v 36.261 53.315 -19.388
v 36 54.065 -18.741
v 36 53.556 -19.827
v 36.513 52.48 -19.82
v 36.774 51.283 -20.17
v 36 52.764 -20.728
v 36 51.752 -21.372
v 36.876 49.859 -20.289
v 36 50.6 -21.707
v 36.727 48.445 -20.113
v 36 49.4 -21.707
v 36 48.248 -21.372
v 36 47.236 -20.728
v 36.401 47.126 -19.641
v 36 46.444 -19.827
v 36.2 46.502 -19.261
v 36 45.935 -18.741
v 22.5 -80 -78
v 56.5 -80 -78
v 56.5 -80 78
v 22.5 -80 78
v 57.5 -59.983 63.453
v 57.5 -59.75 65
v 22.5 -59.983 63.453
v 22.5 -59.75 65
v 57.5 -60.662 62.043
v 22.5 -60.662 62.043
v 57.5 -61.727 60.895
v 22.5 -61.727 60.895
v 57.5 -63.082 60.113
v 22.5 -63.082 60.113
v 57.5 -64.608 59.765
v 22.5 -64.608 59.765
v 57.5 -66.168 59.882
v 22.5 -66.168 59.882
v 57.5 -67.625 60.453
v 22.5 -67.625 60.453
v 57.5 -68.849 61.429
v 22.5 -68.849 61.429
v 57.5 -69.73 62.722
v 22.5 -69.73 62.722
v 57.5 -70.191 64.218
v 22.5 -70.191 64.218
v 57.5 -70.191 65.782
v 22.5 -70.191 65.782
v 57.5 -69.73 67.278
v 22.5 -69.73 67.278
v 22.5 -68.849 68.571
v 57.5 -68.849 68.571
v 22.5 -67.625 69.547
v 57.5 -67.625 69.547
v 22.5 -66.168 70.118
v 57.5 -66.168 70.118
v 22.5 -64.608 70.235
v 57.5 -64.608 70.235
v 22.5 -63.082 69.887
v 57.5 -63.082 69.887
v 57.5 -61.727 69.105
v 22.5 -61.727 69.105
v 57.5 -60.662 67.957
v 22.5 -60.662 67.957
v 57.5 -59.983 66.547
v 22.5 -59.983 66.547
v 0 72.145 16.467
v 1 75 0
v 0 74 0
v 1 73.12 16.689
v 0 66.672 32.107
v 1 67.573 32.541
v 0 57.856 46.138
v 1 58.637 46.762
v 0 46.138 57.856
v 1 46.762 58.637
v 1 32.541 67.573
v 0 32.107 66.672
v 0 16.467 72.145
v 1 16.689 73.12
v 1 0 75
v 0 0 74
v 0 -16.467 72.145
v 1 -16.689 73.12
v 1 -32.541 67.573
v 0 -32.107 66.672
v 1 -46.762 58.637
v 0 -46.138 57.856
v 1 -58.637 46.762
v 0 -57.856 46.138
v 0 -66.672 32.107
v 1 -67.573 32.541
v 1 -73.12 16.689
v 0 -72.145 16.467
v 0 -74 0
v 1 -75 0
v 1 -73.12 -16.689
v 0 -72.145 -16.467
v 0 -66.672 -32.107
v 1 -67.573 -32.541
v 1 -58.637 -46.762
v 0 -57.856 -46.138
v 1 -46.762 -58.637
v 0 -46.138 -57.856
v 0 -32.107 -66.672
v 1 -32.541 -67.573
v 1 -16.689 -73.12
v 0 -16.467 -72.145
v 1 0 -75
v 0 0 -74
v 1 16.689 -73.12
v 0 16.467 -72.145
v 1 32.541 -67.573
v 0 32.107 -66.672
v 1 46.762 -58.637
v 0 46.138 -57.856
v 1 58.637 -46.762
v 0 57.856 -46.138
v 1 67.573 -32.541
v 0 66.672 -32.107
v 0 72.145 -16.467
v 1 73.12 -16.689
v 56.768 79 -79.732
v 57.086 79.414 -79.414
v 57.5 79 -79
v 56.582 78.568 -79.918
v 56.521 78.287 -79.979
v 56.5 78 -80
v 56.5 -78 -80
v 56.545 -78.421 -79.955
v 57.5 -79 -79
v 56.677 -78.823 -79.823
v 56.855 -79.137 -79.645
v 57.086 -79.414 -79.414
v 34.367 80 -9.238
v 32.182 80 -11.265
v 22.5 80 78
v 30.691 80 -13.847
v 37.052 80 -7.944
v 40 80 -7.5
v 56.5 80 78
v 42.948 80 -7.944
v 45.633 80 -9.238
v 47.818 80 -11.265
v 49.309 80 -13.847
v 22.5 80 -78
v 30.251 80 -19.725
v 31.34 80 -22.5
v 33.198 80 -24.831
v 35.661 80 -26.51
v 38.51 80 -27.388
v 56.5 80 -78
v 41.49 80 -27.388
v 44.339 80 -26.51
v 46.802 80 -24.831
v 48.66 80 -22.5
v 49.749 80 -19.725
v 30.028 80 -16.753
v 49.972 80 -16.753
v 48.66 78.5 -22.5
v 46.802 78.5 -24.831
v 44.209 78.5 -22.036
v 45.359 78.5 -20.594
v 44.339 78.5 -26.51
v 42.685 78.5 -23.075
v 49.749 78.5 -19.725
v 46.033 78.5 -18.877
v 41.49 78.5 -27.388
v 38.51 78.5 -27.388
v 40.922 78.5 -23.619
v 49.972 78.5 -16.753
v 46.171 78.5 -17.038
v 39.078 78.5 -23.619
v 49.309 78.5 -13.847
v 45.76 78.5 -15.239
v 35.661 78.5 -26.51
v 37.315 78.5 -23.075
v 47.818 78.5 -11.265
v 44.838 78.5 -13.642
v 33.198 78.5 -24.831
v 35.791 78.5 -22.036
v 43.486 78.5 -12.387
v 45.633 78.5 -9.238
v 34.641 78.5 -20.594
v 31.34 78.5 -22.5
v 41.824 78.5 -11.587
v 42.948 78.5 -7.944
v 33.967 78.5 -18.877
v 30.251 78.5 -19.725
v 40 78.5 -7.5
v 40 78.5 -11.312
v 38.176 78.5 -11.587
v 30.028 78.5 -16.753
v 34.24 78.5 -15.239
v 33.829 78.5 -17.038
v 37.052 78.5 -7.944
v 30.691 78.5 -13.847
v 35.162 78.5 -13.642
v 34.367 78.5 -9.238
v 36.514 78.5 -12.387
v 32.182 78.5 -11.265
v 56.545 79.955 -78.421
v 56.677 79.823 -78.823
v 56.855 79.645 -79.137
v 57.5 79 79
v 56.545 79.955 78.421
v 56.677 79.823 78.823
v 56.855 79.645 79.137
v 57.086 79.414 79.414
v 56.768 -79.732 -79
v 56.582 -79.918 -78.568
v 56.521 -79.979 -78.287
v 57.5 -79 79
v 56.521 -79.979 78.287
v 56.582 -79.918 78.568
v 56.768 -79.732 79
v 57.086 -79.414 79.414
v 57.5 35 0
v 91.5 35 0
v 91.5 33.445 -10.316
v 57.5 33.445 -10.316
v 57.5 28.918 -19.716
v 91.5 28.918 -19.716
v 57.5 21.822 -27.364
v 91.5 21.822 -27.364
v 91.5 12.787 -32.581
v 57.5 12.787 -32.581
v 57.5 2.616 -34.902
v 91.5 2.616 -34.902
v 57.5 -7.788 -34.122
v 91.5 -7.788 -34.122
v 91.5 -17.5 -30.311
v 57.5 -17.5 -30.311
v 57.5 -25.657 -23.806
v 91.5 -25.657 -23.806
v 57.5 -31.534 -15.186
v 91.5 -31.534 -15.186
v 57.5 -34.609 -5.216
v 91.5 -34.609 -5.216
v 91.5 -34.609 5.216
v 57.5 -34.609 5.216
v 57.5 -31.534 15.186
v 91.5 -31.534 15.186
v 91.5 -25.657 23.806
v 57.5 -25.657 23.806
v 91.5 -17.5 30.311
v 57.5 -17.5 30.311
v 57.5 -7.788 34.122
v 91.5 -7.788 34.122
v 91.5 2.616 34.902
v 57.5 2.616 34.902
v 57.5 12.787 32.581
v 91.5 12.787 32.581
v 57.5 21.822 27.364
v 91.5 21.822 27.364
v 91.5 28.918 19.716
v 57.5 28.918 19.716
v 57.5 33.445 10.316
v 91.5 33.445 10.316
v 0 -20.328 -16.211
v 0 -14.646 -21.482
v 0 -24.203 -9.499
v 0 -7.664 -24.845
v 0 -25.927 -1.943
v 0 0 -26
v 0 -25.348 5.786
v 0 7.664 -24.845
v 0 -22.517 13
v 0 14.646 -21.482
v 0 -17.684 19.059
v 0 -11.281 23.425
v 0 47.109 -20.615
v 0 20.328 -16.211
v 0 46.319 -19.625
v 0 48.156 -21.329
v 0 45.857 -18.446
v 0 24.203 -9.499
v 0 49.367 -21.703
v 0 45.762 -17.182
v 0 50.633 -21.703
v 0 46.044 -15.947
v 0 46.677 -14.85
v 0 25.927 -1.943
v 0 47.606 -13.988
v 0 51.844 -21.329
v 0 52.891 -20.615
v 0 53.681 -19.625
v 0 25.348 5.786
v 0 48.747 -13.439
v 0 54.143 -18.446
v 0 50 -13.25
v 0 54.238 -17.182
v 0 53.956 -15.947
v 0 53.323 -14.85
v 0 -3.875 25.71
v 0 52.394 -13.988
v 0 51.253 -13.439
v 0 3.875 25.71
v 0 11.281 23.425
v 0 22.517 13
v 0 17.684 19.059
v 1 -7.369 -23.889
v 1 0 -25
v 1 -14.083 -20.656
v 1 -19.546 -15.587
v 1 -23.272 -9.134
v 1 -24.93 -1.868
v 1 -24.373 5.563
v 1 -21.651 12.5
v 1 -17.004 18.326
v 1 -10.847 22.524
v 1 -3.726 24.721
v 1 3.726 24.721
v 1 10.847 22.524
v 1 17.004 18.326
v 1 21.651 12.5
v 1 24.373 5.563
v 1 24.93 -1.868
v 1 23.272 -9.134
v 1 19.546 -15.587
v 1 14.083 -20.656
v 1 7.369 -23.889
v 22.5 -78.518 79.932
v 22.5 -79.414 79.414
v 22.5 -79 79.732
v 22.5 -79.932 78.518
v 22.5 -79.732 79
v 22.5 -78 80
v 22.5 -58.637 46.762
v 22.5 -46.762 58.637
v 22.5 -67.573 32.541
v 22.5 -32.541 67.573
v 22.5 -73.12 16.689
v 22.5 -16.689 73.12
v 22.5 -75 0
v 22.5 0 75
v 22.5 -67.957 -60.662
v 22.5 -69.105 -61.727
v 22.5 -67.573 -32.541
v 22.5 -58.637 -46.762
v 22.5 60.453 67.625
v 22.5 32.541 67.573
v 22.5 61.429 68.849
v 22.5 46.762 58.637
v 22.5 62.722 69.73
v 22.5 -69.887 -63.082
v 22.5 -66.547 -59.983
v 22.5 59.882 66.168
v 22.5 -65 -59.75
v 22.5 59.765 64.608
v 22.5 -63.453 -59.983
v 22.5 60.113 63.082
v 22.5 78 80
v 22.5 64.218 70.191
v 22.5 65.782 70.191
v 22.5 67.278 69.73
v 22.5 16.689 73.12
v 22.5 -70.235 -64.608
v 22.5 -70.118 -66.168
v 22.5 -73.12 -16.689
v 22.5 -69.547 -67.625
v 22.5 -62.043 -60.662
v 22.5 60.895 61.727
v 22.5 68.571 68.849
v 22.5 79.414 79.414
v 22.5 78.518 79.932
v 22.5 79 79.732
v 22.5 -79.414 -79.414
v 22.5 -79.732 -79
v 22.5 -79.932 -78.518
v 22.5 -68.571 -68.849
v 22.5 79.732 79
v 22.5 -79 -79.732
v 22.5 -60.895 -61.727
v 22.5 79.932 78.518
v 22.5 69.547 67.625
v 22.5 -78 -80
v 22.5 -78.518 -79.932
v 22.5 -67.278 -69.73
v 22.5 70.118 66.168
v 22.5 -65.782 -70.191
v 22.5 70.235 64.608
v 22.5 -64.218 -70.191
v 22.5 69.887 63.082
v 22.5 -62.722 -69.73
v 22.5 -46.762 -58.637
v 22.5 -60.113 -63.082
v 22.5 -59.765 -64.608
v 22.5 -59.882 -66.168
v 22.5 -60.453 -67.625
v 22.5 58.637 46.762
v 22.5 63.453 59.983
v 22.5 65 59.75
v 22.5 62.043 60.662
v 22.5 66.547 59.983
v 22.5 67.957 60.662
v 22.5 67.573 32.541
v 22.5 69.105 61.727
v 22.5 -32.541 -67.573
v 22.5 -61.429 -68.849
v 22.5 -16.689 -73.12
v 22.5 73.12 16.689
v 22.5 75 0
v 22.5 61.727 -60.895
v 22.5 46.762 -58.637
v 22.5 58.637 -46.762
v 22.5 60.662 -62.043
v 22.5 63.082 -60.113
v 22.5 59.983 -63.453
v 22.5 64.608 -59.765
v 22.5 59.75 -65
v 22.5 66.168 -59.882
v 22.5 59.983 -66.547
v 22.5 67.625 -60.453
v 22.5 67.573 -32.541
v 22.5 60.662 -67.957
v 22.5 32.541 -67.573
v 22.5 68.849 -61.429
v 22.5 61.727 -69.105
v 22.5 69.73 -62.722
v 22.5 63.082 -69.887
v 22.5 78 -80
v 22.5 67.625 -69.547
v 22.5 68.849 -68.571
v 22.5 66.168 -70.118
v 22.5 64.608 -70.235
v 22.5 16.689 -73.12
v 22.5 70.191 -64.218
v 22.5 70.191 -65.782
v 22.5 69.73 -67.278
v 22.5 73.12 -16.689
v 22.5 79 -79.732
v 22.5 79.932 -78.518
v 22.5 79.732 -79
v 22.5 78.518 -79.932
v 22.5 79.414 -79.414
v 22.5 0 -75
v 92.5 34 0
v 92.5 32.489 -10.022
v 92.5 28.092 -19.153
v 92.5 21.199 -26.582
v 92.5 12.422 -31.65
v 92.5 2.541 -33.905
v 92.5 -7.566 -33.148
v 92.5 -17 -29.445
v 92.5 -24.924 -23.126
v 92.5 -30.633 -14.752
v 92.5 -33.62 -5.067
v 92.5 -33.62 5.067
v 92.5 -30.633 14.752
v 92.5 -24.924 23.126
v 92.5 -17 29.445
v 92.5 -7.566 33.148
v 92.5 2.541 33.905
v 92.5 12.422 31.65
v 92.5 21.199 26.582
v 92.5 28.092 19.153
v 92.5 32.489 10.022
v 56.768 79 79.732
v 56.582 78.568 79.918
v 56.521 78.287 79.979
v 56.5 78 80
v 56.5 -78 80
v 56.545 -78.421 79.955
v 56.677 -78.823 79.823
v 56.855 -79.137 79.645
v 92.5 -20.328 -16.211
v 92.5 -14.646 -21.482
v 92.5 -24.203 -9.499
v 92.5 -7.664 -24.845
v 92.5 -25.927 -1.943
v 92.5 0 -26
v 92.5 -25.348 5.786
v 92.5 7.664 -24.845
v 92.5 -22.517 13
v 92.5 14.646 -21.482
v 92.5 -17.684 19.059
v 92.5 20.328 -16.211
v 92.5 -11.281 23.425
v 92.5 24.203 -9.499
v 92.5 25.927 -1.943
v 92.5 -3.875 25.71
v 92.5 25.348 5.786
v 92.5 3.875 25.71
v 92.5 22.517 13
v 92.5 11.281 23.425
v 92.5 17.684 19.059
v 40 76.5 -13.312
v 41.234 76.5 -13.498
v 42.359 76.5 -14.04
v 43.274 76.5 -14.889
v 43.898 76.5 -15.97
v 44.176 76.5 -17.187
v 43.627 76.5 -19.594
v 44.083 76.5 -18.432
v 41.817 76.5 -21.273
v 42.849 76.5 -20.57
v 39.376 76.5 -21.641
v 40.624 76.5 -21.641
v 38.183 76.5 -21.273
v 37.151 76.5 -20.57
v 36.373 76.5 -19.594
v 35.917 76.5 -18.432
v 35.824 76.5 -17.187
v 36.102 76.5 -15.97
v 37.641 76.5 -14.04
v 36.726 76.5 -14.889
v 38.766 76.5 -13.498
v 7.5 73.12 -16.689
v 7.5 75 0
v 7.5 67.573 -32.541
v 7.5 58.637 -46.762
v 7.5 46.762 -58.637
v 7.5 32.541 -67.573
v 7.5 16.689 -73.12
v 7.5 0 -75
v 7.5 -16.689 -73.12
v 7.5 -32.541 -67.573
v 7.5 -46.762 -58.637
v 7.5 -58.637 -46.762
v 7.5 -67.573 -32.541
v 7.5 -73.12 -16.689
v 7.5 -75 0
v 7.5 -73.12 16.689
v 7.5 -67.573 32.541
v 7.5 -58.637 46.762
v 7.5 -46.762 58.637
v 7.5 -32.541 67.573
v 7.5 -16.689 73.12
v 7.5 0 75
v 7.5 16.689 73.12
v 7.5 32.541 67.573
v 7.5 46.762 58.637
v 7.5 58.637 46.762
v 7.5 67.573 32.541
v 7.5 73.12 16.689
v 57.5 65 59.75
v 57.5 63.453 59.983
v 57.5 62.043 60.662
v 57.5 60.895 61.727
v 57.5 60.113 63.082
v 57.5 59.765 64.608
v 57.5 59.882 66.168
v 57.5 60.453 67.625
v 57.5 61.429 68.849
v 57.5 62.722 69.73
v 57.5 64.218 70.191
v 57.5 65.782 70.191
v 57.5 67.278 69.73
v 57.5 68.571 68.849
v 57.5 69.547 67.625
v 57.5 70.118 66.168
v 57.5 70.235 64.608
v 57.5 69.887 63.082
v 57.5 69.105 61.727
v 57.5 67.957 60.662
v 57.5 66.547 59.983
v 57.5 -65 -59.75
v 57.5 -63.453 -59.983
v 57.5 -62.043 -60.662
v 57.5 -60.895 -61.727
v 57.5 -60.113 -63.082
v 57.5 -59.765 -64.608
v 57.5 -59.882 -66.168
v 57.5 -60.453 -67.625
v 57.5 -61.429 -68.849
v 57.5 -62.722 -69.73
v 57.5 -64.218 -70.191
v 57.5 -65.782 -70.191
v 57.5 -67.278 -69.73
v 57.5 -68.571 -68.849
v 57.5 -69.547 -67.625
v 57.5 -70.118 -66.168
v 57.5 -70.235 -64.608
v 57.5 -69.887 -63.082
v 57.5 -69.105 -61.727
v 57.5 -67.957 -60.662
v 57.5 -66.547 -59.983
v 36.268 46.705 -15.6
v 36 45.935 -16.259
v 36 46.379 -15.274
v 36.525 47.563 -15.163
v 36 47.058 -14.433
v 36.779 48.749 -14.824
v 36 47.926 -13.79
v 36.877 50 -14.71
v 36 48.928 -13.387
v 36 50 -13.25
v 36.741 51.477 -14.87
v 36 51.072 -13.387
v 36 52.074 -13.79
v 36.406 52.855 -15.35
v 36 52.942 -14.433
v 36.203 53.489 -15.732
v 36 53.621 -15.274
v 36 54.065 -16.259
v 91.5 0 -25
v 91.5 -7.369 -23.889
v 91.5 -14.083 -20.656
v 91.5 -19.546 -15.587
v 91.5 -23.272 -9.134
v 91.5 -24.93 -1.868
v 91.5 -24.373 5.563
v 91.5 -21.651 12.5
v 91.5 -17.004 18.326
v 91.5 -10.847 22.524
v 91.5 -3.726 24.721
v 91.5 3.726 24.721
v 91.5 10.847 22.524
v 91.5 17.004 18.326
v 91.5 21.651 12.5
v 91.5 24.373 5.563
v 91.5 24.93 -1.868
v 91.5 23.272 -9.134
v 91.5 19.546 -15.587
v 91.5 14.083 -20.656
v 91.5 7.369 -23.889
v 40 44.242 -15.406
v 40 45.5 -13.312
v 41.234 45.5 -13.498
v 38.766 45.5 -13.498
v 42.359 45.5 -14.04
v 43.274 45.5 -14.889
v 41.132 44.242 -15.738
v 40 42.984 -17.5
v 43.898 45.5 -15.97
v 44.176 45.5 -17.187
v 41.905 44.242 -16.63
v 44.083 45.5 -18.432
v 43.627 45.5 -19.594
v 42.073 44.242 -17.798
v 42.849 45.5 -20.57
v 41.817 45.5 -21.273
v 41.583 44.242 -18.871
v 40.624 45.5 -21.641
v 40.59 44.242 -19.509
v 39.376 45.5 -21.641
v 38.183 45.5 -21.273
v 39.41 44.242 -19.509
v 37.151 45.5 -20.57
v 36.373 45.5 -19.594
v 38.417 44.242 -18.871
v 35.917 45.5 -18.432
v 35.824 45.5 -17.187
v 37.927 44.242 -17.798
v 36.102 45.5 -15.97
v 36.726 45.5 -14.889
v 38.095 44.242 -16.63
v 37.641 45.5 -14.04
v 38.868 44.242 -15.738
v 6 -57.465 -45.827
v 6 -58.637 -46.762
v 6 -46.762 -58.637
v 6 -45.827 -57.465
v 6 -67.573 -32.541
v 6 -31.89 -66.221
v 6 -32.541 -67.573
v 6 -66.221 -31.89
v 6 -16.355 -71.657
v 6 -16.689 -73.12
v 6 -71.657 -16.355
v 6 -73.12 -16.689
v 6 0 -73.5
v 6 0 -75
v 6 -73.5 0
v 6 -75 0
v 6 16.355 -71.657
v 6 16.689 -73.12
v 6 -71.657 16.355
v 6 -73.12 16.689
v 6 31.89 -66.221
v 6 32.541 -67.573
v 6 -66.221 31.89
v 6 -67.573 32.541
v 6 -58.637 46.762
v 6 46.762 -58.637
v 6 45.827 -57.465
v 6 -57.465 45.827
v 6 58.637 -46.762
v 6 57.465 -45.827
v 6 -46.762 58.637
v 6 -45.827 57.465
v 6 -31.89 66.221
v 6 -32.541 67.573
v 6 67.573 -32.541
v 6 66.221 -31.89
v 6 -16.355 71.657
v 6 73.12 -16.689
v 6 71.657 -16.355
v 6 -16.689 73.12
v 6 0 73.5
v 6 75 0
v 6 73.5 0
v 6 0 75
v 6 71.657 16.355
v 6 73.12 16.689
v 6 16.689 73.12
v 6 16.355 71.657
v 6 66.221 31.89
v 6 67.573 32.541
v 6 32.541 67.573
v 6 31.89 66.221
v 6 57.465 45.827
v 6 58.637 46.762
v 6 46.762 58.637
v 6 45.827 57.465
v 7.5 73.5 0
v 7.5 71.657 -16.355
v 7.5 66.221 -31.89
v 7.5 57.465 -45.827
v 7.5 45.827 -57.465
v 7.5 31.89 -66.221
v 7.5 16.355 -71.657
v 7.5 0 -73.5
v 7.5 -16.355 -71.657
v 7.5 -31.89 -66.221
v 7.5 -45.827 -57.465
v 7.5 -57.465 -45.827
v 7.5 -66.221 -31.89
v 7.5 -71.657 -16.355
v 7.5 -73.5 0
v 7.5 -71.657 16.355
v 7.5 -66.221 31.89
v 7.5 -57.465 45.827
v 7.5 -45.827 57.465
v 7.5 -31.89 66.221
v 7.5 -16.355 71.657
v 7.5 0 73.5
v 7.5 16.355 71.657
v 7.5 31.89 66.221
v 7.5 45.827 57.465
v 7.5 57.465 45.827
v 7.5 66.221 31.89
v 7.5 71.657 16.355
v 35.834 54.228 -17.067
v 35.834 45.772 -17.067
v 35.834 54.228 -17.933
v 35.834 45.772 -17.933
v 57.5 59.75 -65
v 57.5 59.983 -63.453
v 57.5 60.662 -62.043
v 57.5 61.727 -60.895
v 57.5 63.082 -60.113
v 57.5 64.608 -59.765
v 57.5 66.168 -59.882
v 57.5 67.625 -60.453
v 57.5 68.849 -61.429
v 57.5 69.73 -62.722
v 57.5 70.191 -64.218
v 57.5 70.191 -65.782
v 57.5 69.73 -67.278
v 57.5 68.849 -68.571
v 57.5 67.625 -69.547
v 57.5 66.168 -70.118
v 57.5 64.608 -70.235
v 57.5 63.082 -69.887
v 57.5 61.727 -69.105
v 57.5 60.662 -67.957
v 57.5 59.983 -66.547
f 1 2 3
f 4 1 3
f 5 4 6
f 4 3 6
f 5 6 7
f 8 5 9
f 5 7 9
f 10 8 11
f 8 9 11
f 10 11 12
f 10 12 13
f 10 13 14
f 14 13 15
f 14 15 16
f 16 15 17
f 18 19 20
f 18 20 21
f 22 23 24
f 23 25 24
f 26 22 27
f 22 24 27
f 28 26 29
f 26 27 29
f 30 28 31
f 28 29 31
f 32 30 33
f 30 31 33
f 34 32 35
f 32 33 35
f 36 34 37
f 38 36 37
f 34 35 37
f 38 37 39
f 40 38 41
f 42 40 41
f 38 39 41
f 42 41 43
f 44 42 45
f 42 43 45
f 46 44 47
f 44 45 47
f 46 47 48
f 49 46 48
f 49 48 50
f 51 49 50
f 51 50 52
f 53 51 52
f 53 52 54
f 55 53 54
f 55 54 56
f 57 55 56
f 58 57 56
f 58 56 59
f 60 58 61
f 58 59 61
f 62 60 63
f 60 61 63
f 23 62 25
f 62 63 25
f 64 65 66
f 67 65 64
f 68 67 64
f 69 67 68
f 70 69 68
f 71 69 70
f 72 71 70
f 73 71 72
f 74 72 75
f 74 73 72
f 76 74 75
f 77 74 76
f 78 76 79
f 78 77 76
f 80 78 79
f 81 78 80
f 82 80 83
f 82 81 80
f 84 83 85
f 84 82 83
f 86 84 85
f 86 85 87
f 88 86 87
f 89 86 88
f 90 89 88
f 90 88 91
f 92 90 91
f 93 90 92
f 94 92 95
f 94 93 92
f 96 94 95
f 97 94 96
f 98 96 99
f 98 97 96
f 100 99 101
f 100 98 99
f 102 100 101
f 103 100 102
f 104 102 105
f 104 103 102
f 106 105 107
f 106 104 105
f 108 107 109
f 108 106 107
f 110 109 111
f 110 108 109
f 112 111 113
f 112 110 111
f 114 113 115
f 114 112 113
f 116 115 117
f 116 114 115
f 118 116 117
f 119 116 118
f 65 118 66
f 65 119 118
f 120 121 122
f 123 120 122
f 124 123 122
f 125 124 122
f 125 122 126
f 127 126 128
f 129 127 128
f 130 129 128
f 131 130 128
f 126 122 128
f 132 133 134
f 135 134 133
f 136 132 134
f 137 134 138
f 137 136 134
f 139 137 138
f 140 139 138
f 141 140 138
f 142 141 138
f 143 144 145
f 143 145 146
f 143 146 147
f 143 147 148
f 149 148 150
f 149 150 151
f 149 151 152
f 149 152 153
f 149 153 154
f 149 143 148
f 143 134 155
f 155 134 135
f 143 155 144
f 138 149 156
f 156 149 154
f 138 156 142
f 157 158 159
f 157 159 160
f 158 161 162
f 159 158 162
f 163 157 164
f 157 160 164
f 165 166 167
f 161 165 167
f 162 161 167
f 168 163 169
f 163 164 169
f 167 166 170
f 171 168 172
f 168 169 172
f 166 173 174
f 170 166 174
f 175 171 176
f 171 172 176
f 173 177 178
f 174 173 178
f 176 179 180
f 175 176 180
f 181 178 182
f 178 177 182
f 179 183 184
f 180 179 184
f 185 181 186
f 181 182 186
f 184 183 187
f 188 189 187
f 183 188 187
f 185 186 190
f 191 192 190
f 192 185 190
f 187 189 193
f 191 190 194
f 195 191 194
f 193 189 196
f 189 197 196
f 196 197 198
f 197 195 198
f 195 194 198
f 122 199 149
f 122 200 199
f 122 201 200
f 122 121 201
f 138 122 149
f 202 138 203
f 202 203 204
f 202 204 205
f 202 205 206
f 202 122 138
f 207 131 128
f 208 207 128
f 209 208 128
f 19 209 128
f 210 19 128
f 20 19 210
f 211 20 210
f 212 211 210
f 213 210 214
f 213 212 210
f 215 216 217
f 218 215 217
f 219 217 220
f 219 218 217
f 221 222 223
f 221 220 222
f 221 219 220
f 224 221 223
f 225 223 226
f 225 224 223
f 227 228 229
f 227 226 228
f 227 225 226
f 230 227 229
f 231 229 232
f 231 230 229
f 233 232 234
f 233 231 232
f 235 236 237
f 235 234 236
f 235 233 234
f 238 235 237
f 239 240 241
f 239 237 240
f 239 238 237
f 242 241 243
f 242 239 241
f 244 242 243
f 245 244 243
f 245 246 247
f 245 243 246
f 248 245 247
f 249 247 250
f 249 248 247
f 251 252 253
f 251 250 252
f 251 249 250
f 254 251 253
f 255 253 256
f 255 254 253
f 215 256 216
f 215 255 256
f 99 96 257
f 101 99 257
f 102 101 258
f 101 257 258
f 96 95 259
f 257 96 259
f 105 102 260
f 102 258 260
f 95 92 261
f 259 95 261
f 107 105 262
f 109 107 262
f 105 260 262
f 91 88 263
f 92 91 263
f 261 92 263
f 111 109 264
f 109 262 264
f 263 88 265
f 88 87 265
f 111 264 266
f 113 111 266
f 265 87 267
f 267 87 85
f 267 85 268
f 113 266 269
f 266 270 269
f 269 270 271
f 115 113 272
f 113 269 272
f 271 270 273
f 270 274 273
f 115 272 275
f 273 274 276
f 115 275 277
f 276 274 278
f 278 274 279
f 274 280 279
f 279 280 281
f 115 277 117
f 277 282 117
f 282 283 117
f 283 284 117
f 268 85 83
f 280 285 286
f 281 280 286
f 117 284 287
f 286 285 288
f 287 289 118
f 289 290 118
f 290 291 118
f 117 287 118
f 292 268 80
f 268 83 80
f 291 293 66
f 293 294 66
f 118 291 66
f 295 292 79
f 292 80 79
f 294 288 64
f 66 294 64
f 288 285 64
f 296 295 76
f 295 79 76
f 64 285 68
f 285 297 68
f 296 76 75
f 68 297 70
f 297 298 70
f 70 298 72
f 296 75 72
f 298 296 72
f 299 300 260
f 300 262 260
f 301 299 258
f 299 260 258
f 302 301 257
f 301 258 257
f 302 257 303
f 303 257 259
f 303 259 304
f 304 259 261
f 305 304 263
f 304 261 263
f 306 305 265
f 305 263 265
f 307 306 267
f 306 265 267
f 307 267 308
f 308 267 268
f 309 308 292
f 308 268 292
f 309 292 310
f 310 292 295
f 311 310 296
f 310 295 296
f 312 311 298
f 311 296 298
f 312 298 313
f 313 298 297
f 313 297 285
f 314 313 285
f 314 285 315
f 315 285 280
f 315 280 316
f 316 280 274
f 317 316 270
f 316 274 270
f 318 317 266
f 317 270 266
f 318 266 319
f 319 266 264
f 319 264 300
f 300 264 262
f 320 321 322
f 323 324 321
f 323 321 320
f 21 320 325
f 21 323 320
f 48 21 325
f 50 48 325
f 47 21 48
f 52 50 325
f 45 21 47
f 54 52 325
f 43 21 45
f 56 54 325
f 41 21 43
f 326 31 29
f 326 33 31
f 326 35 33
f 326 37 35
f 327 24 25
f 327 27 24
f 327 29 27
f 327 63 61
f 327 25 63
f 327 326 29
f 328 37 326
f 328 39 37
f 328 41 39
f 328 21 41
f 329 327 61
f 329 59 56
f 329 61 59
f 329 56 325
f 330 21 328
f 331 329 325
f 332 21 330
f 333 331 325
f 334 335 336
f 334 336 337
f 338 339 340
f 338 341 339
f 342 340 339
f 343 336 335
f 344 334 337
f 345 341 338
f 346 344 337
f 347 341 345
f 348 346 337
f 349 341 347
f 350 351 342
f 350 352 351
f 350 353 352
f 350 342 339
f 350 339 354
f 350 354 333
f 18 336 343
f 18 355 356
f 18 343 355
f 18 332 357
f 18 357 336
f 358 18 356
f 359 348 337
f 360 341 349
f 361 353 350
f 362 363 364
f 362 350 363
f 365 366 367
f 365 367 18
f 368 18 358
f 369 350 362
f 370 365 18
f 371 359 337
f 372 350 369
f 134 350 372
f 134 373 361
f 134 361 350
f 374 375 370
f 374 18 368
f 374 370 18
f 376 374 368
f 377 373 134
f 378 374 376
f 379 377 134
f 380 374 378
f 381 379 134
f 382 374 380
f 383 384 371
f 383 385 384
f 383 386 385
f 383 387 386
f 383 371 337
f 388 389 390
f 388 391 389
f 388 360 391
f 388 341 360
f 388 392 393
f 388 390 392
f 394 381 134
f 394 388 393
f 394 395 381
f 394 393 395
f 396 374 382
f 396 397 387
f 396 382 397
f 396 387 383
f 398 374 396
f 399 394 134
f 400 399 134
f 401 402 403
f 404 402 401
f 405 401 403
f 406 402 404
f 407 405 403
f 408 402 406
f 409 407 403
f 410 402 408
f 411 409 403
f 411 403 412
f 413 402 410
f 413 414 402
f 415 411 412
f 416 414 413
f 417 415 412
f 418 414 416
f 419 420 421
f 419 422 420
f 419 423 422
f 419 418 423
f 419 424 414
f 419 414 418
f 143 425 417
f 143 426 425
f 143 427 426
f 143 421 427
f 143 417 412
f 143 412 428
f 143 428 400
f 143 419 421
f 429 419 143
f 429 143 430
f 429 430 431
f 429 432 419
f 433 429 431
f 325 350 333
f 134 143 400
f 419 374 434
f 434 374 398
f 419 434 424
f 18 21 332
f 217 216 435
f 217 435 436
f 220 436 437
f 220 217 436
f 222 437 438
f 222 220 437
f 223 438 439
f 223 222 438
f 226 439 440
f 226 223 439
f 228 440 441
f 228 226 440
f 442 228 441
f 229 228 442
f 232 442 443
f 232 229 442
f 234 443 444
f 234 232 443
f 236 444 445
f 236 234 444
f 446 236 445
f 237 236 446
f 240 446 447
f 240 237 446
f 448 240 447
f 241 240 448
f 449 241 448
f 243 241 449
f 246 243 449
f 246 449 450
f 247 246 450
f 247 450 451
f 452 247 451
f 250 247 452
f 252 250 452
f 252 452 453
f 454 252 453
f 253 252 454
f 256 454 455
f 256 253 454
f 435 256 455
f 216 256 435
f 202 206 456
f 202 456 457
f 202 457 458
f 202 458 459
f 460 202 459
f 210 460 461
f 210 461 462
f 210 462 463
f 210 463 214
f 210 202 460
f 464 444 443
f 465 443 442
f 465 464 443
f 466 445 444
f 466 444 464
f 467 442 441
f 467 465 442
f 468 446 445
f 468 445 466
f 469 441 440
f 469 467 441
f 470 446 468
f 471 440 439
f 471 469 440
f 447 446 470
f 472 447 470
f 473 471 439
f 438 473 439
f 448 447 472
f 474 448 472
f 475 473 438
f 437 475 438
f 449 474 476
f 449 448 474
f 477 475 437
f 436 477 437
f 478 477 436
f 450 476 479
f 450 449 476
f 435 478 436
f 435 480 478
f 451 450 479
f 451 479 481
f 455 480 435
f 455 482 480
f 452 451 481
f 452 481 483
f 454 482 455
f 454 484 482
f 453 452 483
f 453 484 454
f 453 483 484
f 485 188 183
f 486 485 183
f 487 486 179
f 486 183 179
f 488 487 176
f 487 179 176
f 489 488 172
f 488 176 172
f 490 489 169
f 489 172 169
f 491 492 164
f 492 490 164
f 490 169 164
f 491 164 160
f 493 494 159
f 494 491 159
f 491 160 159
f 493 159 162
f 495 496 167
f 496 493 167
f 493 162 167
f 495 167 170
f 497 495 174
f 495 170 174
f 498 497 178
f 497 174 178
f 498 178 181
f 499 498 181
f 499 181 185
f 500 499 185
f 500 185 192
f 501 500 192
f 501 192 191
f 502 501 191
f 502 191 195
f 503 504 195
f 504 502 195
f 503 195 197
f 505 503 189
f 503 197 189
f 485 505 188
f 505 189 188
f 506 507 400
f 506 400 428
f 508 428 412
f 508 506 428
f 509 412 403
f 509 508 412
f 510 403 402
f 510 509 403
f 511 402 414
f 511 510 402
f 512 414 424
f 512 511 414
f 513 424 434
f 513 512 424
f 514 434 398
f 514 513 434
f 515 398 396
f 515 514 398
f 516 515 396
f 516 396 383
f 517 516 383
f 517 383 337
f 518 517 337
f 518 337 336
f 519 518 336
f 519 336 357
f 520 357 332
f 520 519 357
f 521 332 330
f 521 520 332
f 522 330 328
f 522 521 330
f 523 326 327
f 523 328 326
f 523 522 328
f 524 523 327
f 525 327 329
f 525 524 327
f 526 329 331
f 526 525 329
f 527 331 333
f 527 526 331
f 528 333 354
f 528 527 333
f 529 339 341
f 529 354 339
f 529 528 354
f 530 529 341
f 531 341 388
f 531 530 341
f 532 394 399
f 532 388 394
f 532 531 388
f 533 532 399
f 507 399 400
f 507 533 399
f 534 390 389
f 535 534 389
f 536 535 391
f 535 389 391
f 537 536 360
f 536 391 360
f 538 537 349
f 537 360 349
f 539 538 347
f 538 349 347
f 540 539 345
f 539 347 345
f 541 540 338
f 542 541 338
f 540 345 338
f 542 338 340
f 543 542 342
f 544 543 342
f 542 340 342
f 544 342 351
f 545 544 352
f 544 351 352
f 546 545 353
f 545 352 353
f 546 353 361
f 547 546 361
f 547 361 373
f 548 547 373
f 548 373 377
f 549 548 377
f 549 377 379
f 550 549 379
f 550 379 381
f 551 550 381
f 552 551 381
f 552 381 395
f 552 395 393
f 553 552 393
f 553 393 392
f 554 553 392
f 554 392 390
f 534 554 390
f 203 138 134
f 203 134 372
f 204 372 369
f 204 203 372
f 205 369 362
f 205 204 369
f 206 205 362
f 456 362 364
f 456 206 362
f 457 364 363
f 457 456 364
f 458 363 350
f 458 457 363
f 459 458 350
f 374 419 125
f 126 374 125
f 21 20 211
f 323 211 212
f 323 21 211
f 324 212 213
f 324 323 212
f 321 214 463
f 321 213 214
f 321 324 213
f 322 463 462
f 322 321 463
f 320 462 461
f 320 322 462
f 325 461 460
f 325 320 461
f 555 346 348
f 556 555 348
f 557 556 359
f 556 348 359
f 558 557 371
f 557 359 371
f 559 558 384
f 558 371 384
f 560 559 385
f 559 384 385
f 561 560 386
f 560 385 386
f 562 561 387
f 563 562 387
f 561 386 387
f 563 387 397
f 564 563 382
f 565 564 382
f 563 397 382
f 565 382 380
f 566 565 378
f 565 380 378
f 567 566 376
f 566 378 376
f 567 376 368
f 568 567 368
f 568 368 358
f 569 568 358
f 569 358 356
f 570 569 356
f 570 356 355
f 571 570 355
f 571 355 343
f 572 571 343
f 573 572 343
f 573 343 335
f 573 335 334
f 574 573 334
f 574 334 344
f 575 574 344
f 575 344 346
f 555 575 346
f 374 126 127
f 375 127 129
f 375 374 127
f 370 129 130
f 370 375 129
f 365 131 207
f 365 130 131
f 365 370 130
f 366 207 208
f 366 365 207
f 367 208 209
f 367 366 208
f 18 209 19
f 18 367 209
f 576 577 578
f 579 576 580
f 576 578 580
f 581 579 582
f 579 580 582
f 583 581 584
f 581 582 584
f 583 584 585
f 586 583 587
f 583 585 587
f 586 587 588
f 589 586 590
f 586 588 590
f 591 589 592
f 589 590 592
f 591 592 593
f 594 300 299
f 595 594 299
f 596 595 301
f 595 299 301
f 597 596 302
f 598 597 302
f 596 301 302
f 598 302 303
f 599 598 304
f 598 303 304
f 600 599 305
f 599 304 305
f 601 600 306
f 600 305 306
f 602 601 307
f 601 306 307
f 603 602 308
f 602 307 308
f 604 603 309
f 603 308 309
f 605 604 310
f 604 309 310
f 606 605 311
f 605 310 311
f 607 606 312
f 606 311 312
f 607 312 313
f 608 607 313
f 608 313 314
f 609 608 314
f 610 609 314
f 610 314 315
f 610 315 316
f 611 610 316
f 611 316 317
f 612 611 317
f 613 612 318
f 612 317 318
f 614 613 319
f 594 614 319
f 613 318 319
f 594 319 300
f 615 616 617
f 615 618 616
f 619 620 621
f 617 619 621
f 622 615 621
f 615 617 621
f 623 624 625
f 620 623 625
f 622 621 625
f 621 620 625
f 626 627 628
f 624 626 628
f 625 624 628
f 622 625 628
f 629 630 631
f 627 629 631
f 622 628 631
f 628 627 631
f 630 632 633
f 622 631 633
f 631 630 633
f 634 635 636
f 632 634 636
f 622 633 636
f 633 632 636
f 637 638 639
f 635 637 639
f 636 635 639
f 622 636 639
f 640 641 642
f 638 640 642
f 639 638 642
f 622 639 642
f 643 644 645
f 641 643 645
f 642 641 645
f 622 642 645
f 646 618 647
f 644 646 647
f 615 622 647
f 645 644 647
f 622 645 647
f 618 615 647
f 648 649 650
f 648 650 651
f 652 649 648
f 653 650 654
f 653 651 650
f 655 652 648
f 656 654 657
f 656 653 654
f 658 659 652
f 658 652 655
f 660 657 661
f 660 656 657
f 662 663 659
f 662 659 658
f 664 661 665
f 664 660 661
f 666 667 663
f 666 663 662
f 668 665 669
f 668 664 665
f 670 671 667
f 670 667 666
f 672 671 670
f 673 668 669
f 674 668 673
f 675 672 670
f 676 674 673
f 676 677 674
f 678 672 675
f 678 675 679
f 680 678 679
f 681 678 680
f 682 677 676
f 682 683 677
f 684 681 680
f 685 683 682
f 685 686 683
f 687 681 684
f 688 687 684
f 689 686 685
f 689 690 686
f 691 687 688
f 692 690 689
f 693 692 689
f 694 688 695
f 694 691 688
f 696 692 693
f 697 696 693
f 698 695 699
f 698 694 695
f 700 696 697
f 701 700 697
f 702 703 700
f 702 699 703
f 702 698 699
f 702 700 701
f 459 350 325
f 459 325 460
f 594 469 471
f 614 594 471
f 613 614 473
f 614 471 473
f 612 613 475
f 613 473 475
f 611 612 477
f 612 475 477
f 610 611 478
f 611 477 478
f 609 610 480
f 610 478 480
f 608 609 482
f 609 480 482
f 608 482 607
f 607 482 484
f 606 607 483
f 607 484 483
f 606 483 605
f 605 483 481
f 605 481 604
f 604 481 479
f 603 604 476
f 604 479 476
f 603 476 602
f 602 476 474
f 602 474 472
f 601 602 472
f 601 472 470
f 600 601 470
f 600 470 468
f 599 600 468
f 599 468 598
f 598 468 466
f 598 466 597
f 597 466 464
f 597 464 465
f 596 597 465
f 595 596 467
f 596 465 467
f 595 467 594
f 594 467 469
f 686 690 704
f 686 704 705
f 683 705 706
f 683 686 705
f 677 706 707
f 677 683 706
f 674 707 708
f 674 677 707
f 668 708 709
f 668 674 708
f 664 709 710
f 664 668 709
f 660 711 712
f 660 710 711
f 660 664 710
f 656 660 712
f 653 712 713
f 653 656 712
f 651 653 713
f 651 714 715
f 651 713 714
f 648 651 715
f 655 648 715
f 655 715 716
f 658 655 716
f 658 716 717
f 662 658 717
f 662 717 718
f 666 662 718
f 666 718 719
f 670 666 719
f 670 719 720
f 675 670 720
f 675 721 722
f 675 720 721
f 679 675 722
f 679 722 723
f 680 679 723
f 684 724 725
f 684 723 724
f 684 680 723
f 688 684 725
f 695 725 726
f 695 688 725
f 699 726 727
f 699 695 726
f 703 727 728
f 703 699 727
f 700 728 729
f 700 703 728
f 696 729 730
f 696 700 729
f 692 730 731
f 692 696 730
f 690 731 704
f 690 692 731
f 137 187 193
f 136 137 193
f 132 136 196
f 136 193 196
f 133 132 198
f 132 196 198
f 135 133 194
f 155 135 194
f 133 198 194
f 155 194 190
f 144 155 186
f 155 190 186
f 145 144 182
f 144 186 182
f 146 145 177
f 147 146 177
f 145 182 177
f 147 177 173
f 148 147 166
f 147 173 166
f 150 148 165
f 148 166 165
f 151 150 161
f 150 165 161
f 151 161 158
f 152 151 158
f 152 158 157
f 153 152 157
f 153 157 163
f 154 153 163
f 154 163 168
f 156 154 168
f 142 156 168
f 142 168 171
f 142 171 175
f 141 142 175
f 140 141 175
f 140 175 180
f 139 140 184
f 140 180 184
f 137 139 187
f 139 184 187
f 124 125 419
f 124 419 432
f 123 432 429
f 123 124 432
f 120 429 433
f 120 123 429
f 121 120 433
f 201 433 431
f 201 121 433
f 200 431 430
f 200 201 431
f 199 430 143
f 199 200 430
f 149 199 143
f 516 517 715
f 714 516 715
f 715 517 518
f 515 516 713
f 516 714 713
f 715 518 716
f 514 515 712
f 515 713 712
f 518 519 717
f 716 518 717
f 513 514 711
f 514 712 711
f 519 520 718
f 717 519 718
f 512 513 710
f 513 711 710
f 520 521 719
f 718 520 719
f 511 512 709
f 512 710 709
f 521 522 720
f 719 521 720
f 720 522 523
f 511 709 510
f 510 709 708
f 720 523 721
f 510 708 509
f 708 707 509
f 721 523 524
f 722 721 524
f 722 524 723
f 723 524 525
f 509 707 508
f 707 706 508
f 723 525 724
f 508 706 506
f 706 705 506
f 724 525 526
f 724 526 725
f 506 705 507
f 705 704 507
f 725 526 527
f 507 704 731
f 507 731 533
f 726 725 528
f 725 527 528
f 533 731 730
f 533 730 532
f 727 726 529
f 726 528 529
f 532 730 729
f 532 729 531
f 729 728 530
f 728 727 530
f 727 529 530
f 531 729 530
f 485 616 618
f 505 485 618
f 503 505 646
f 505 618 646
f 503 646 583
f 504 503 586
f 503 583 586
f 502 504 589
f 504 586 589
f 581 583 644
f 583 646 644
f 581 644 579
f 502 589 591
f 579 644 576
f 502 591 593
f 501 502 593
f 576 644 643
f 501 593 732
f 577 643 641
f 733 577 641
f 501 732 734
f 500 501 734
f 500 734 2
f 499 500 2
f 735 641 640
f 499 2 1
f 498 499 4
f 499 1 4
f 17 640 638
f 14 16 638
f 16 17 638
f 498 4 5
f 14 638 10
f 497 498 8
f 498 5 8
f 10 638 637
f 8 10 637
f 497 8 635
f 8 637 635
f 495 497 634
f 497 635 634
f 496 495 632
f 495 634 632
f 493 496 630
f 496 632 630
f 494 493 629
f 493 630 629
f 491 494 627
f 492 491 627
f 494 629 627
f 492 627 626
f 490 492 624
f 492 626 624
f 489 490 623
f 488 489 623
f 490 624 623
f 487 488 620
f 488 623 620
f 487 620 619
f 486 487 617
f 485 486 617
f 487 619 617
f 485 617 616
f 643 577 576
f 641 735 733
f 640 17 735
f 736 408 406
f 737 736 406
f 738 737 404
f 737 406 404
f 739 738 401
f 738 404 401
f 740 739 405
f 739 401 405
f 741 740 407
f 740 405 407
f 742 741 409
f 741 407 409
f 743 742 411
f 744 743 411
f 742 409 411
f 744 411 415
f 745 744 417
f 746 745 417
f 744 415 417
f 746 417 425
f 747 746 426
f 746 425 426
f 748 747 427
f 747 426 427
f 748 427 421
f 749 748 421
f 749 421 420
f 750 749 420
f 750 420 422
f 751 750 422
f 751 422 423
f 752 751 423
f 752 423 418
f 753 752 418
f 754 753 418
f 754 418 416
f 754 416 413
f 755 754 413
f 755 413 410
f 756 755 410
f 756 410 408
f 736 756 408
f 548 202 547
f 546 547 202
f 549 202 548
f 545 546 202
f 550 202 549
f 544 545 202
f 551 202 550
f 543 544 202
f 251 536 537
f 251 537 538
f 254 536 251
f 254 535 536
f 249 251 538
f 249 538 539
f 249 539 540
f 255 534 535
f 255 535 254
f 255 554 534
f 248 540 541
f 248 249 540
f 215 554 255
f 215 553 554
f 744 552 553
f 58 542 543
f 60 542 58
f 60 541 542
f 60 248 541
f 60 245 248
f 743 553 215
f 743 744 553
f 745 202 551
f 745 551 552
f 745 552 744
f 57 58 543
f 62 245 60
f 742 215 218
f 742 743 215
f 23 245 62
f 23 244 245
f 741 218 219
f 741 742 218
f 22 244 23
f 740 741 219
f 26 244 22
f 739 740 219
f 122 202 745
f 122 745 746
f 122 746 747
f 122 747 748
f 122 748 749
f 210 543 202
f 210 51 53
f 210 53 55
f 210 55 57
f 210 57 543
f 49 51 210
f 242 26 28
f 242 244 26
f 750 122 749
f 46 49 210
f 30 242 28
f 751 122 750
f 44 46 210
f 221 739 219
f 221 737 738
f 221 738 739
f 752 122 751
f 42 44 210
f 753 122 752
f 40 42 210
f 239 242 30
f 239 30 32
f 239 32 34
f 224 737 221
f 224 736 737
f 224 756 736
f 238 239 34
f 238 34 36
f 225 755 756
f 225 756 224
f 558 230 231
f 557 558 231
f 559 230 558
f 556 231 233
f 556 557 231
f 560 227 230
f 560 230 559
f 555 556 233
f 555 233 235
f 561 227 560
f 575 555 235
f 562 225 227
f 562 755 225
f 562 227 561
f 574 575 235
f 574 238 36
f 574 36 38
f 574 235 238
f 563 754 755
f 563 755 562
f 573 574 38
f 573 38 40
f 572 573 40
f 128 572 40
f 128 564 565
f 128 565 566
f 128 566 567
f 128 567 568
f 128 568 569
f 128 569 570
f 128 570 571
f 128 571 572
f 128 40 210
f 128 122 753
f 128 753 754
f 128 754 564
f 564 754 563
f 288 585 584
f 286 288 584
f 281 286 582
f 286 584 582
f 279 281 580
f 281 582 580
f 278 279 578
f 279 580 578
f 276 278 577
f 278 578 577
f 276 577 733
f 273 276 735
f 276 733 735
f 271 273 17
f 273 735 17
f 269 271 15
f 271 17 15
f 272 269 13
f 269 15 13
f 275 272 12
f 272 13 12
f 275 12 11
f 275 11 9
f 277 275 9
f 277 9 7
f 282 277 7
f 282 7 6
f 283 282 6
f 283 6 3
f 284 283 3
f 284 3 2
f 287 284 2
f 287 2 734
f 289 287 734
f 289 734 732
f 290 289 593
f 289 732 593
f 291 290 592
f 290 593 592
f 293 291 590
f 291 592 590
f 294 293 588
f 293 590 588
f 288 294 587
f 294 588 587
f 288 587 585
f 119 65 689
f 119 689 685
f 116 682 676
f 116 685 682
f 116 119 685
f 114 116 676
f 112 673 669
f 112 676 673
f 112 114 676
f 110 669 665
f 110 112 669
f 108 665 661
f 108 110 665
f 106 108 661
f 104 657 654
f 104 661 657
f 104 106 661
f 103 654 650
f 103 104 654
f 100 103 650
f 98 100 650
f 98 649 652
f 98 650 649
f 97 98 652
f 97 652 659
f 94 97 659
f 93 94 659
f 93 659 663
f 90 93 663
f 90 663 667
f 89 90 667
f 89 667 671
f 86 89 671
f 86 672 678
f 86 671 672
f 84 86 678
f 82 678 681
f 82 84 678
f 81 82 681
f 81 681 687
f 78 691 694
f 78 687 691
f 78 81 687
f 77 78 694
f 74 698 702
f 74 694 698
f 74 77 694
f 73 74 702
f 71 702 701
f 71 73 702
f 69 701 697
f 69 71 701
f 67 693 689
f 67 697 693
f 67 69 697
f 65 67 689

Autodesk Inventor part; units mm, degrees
ref_plane "YZ Plane" through (0, 0, 0) normal (1, 0, 0) x (0, 1, 0)
ref_plane "XZ Plane" through (0, 0, 0) normal (0, 1, 0) x (-1, 0, 0)
ref_plane "XY Plane" through (0, 0, 0) normal (0, 0, 1) x (1, 0, 0)
sketch "Skizze1" plane through (0, 0, 0) normal (0, 0, 1) x (1, 0, 0)
  line L0 (0, 0) -> (22.5, 0)
  line L1 (22.5, 0) -> (22.5, 75)
  line L2 (22.5, 75) -> (0, 75)
  line L3 (0, 75) -> (0, 0)
  line L4 (22.5, 80) -> (57.5, 80)
  line L5 (57.5, 80) -> (57.5, -80)
  line L6 (57.5, -80) -> (22.5, -80)
  line L7 (22.5, -80) -> (22.5, 80)
  line L8 (57.5, 0) -> (92.5, 0)
  line L9 (92.5, 0) -> (92.5, 35)
  line L10 (92.5, 35) -> (57.5, 35)
  line L11 (57.5, 35) -> (57.5, 0)
  line L12 (6, 75) -> (7.5, 75)
  line L13 (7.5, 75) -> (7.5, 73.5)
  line L14 (7.5, 73.5) -> (6, 73.5)
  line L15 (6, 73.5) -> (6, 75)
  dimension "d9" = 160
  dimension "d10" = 70
  dimension "d11" = 150
  dimension "d12" = 22.5
  dimension "d13" = 35
  dimension "d14" = 92.5
  dimension "d15" = 6
  dimension "d16" = 1.5
  dimension "d17" = 147
revolve "Umdrehung1" add sketch "Skizze1" angle 360 about axis through (0, 0, 0) along (1, 0, 0) contours L3 L2 L15 L14 L13 L1 L0 | L5 L10 L9 L8
extrude "Extrusion1" add sketch "Skizze1" along normal mid plane 160 contours L1 L7 L4 L5 L6
sketch "Skizze2" plane through (92.5, 0, 0) normal (1, 0, 0) x (0, 0, -1)
  circle A0 centre (0, 0) radius 35 projected
hole "Bohrung1" at (92.5, 0, 0) direction (-1, 0, 0) diameter 50 end through all
sketch "Skizze3" plane through (57.5, -80, 80) normal (1, 0, 0) x (0, 0, -1)
  line L0 (0, 160) -> (160, 160) projected
  line L1 (0, 160) -> (30, 160)
  line L2 (30, 160) -> (30, 130)
  line L3 (30, 130) -> (0, 130)
  line L4 (0, 130) -> (0, 160)
  line L5 (145, 15) -> (15, 15)
  line L6 (15, 15) -> (15, 145)
  line L7 (15, 145) -> (145, 145)
  line L8 (145, 145) -> (145, 15)
  line L9 (145, 15) -> (15, 145) construction
  line L10 (15, 15) -> (145, 145) construction
  point P0 (80, 80)
  dimension "d28" = 30
  dimension "d29" = 30
  dimension "d30" = 130
  dimension "d31" = 130
hole "Bohrung2" at (57.5, 65, 65) direction (-1, 0, 0) diameter 10.5 end through all
pattern_circular "Runde Anordnung1" count 4 over 360 about axis through (75, 0, 0) along (1, 0, 0) of "Bohrung2"
sketch "Skizze5" plane through (0, 0, 0) normal (-1, 0, 0) x (0, 0, 1)
  line L0 (80, 80) -> (-80, 80) projected
  line L1 (-80, 80) -> (-80, -80) projected
  point P0 (0, 0)
  point P1 (-17.5, 50)
  point P2 (-80, 50)
  point P3 (-80, -50)
  dimension "d54" = 30
  dimension "d55" = 62.5
hole "Bohrung3" at (0, 50, -17.5) direction (1, 0, 0) diameter 8.5 depth 36 tip angle 118
sketch "Skizze6" plane through (22.5, 80, 80) normal (0, 1, 0) x (1, 0, 0)
  line L0 (35, 160) -> (35, 0) projected
  line L1 (5, 160) -> (35, 160) projected
  point P0 (-22.5, 80)
  point P1 (17.5, 97.5)
  point P2 (35, 130)
  point P3 (35, 30)
  dimension "d63" = 17.5
  dimension "d64" = 62.5
hole "Bohrung4" at (40, 80, -17.5) direction (0, -1, 0) diameter 8.376 depth 34.5 tip angle 118 counterbore diameter 20 counterbore depth 1.5 thread size "M10x1.5" class "6H" standard "ISO Metric profile"
chamfer "Fase1" distance 2 angle 45 1 edges at (40, 78.5, -21.688)
chamfer "Fase2" distance 1 angle 45 8 edges at (0, -75, 0) (0, 0, 25) (92.5, 0, 25) (92.5, -35, 0) (57.5, 0, 80) (57.5, 80, 0) (57.5, 0, -80) (57.5, -80, 0)
fillet "Rundung2" radius 2 4 edges at (39.5, 80, -80) (39.5, 80, 80) (39.5, -80, -80) (39.5, -80, 80)
equation "\"d19\" = d9"
properties part number "Deckel_vorne" material "Stahl AISI 4130"
